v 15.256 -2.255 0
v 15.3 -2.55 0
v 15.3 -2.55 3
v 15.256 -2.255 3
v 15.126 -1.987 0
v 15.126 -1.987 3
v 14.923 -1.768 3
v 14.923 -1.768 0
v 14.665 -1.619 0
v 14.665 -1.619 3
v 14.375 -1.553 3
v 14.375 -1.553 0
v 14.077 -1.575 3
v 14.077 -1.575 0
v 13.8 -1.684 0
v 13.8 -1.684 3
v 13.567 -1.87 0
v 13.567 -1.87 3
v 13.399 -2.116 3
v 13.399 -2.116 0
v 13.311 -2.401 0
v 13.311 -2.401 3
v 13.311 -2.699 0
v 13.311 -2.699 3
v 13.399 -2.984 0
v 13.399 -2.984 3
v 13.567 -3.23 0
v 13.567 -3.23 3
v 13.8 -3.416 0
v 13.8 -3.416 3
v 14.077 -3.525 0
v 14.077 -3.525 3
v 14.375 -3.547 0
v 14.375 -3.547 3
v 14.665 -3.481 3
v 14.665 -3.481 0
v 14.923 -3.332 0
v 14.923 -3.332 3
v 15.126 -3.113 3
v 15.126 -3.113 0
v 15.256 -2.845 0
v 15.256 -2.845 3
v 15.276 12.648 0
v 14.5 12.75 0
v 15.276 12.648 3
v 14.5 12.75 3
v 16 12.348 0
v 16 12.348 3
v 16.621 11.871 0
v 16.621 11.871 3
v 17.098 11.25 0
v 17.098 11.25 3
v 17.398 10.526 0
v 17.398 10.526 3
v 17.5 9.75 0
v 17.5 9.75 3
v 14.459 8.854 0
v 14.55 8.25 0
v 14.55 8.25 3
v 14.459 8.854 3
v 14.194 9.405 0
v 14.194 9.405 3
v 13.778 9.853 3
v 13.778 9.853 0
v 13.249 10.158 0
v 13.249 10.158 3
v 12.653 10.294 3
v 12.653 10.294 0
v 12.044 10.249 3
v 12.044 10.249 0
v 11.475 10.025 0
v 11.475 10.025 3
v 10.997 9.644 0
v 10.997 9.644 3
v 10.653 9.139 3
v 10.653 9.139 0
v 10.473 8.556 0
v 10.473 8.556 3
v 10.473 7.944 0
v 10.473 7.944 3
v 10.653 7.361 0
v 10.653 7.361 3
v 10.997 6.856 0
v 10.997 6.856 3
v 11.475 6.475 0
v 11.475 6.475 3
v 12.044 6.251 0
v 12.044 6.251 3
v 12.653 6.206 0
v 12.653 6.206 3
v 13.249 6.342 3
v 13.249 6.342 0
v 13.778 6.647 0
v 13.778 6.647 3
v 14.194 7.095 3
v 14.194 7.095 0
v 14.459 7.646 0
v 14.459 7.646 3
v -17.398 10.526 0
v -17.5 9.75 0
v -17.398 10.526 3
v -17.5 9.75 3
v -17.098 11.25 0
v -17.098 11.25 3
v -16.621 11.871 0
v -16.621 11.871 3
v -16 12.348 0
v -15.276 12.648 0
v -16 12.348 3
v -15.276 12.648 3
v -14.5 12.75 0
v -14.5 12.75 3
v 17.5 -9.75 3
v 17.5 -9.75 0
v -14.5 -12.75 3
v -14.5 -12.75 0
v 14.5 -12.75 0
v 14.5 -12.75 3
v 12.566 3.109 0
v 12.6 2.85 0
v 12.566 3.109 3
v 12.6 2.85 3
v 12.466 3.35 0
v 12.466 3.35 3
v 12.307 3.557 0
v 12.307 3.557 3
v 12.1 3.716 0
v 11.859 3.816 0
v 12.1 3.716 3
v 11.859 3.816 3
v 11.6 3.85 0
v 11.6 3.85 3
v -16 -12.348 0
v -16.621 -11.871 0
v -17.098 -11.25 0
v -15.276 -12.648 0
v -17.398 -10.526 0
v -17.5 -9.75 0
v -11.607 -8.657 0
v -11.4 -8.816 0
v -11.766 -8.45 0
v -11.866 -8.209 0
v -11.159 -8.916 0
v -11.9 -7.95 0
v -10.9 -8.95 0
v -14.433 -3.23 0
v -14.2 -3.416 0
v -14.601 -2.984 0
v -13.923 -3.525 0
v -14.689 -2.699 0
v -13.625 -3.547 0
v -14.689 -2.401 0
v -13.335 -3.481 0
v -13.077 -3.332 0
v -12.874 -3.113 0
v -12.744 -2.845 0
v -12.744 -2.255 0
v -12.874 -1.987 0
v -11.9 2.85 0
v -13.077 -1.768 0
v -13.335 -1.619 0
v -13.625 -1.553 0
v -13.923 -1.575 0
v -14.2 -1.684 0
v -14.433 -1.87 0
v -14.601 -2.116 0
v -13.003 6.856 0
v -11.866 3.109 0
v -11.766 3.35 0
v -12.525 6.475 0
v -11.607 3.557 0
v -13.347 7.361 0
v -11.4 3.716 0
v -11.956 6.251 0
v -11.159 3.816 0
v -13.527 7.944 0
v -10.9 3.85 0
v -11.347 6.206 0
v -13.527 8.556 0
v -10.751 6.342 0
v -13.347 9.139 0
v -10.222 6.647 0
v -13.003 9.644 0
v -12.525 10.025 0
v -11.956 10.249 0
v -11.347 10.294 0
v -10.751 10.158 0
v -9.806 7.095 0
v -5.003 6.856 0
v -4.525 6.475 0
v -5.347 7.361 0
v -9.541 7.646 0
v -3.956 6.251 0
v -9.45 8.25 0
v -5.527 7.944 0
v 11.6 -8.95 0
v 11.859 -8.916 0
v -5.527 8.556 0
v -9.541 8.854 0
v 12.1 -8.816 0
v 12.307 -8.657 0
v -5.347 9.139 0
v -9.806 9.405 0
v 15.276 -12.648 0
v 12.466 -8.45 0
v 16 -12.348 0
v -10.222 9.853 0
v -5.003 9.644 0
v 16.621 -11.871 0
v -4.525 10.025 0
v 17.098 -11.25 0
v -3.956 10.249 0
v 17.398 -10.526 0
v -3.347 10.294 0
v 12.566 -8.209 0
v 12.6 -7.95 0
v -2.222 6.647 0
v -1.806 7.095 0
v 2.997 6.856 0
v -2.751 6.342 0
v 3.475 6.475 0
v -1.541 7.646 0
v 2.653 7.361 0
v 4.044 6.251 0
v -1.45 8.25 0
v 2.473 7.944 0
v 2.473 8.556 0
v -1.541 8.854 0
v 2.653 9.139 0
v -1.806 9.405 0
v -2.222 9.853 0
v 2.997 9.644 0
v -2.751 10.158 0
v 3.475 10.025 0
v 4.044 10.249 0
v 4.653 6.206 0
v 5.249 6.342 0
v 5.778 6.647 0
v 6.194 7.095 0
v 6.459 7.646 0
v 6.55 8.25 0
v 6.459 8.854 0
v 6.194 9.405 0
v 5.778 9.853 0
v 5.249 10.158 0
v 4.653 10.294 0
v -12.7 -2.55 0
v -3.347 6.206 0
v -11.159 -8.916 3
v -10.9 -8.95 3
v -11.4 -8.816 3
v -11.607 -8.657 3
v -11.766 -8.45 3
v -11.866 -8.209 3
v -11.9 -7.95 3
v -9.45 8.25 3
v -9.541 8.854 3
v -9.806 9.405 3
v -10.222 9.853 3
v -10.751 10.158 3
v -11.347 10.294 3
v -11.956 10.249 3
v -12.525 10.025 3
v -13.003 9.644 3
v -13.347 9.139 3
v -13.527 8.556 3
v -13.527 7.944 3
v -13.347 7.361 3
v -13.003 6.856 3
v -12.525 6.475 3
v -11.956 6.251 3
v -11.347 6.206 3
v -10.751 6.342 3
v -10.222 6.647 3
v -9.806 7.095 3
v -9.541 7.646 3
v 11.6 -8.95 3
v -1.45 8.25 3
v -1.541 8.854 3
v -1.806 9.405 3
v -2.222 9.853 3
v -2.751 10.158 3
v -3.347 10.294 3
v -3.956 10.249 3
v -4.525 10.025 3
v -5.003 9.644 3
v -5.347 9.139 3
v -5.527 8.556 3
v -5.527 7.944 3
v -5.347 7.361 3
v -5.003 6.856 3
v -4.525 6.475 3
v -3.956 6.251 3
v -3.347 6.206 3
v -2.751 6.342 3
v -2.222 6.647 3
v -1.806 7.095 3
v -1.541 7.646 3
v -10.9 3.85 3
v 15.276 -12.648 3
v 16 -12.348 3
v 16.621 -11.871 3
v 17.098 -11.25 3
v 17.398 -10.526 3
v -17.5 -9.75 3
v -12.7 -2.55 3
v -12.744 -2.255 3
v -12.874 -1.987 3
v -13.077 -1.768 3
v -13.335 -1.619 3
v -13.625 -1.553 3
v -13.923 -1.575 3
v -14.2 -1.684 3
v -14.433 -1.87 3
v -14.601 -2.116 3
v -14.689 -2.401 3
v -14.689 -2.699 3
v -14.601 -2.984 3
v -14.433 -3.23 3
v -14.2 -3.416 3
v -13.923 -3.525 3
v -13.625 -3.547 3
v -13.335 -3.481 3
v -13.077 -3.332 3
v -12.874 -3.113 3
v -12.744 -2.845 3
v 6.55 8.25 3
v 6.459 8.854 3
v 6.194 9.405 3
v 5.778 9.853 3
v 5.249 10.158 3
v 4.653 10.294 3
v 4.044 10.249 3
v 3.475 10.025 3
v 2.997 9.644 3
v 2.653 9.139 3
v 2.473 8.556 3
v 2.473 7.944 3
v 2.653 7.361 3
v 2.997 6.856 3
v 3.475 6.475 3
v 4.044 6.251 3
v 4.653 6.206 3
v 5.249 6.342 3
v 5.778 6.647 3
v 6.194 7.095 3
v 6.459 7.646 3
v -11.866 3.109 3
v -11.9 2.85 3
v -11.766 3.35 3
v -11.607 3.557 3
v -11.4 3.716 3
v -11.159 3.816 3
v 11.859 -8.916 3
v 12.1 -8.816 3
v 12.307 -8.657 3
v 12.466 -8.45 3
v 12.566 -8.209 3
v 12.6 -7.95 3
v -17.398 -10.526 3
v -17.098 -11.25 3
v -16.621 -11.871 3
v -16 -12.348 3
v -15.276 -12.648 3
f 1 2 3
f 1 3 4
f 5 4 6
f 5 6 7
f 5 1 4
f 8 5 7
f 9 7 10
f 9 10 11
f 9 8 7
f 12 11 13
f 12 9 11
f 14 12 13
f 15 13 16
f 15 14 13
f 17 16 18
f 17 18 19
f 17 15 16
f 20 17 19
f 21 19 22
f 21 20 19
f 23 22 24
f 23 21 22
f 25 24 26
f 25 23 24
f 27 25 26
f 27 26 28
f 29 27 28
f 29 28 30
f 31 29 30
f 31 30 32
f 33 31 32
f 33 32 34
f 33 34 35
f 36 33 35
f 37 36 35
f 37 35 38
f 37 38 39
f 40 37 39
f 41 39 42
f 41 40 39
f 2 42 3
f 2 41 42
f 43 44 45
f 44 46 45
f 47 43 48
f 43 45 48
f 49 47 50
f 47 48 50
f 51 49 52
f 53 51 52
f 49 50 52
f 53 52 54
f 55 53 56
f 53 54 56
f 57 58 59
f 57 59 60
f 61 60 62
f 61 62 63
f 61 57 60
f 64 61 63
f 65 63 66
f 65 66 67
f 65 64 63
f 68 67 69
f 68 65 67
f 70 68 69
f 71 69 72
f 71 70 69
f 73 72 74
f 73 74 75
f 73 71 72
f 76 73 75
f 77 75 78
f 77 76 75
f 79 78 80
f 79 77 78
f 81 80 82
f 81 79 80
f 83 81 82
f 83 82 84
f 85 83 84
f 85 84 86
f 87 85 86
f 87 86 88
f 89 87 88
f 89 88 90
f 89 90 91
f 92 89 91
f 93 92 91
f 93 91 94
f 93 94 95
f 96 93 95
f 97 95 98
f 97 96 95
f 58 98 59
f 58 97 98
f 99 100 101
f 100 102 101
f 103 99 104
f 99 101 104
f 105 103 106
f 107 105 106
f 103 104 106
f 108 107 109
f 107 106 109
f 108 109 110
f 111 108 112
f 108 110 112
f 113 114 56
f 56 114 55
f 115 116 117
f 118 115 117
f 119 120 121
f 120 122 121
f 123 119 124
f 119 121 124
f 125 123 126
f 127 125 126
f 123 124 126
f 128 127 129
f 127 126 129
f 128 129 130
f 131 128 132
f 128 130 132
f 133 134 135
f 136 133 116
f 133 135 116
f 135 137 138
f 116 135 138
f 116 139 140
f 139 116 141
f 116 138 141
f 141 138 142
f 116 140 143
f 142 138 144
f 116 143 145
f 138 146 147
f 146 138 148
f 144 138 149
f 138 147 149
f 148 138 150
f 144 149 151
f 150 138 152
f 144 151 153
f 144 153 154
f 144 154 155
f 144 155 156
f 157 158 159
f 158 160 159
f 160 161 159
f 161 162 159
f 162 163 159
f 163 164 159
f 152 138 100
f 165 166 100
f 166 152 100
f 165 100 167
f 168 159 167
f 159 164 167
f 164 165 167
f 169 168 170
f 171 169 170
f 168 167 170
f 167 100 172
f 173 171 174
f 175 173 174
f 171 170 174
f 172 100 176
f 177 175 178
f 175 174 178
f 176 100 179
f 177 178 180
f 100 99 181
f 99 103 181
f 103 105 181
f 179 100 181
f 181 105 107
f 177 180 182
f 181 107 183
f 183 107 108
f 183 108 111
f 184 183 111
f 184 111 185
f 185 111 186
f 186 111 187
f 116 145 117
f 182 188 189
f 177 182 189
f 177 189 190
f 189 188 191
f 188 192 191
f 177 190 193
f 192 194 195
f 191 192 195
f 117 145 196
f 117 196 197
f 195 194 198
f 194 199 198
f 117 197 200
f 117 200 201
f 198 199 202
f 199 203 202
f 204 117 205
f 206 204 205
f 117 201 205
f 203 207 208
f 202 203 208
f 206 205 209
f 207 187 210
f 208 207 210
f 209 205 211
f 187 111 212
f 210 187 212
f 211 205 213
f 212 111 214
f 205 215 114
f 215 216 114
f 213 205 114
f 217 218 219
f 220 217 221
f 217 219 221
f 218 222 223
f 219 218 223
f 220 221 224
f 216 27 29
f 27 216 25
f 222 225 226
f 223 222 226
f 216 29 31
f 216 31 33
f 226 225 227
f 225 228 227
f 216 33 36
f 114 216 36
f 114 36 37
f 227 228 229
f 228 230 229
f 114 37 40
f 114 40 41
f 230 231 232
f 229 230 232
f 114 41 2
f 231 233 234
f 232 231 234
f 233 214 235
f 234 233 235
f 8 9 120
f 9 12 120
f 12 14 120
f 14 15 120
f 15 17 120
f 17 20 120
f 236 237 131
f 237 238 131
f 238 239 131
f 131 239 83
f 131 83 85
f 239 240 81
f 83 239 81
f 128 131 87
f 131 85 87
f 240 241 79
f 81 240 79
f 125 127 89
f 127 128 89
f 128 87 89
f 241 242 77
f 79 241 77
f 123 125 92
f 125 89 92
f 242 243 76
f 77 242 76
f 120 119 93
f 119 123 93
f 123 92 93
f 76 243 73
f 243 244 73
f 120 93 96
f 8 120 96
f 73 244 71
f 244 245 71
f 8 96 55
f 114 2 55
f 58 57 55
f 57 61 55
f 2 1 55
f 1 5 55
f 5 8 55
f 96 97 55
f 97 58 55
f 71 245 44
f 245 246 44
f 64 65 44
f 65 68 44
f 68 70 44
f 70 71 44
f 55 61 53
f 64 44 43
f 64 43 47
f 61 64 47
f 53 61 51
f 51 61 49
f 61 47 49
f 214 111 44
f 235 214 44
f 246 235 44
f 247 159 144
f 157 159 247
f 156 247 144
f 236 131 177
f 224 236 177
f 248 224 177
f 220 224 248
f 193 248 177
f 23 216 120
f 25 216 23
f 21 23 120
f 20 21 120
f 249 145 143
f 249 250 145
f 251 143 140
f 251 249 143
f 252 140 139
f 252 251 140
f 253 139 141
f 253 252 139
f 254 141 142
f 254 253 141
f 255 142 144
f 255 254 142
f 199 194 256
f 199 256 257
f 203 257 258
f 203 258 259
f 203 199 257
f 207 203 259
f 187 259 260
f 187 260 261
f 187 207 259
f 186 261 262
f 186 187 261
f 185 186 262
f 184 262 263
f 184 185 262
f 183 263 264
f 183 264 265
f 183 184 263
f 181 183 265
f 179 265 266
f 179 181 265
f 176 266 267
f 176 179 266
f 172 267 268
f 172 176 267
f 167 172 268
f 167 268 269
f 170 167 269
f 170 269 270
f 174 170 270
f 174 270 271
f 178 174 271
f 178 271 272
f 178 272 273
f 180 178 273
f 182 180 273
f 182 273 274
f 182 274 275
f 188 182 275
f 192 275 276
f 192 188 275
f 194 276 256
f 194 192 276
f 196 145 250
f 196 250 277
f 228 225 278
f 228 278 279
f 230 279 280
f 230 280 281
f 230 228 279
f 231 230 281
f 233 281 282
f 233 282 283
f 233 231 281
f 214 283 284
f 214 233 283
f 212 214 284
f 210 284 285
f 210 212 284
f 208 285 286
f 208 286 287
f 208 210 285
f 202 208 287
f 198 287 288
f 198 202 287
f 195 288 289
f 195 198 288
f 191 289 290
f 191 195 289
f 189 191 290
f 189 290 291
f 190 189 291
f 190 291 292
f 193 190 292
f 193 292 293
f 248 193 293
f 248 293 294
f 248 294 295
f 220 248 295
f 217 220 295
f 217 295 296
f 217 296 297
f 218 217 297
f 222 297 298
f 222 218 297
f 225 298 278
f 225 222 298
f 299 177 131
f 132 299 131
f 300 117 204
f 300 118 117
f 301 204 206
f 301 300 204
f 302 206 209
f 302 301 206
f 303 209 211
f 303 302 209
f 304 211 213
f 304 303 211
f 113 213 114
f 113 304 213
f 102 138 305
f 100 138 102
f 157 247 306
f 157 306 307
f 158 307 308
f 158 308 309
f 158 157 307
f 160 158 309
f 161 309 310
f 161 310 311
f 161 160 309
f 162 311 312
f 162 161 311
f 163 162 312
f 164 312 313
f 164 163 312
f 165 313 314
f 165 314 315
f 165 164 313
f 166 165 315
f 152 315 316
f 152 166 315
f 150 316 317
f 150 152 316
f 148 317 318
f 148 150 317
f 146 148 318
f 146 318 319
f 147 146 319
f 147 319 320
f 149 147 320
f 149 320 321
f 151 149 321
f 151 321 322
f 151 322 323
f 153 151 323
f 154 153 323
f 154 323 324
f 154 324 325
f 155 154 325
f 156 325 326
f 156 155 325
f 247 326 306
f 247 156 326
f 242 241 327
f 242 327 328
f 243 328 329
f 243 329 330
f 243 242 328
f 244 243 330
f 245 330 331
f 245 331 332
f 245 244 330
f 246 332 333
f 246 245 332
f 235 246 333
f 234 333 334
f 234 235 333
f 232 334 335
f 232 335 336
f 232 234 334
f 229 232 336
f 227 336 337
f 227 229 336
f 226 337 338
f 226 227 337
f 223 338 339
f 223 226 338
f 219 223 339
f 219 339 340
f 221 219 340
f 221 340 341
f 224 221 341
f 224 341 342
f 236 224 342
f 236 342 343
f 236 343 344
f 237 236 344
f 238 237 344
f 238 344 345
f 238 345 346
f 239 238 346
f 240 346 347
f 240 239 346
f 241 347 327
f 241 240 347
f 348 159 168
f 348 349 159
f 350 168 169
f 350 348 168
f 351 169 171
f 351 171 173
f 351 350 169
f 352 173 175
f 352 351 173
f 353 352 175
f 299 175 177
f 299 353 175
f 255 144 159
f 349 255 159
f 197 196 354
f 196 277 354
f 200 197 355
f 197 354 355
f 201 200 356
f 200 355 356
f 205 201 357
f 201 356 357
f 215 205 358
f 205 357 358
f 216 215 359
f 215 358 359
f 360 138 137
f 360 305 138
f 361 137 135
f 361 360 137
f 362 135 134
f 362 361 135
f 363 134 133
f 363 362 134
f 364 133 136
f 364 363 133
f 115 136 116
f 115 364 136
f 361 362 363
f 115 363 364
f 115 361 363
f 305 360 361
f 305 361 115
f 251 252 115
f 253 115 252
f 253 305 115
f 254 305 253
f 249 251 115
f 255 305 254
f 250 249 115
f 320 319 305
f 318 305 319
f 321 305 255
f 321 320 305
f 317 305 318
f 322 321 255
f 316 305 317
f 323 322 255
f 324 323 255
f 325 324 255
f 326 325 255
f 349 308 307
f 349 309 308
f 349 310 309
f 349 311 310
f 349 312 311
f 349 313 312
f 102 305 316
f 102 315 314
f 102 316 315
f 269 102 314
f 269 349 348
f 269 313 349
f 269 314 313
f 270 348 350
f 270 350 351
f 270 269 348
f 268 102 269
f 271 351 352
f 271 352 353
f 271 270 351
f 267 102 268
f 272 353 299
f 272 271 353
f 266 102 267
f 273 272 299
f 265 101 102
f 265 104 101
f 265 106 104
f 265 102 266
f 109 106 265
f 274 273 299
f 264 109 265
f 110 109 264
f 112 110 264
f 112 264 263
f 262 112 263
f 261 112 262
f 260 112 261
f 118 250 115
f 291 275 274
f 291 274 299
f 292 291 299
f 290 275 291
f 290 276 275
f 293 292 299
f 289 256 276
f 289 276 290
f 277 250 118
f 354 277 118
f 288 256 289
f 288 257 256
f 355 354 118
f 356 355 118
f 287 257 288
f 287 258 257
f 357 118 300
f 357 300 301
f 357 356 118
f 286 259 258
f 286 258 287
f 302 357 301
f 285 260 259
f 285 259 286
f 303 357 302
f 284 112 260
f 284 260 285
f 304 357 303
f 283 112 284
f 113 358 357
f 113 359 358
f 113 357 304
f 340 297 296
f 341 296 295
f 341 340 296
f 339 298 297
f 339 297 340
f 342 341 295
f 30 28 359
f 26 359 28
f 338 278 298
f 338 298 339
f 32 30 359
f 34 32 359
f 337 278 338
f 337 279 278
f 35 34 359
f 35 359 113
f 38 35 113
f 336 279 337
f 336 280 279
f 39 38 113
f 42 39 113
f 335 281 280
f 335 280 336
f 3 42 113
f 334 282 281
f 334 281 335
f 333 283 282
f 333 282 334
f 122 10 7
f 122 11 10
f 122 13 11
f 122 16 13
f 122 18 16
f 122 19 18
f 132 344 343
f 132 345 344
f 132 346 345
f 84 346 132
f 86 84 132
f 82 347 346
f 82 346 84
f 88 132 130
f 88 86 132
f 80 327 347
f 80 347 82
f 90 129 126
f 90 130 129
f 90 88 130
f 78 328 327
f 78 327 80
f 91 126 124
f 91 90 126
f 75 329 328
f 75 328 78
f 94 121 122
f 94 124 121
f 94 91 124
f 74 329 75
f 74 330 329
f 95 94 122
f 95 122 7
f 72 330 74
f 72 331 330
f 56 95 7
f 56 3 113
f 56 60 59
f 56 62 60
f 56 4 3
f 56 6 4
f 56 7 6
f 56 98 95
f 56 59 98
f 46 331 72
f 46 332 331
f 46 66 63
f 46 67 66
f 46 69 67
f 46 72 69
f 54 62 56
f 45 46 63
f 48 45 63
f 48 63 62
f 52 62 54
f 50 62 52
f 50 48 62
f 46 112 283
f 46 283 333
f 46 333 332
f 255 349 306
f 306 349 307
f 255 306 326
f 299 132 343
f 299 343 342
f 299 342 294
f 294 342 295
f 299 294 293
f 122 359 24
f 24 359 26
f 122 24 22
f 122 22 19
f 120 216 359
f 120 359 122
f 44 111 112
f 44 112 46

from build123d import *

# Parameters (mm, degrees)
F1_W     = 35
F1_H     = 25.5
F1_R     = 1
F1_W_2   = 24.5
F1_H_2   = 12.8
F1_R_2   = 2.05
F2_DEPTH = 3
F3_R     = 3
F4_R     = 1


with BuildPart() as f2:
    # F1 (on Top) → F2 (new body)
    with BuildSketch(Plane.XY):
        Rectangle(F1_W, F1_H)
        with Locations((-13.7, -2.55)):
            Circle(F1_R, mode=Mode.SUBTRACT)
        with Locations((0.35, -2.55)):
            Rectangle(F1_W_2, F1_H_2, mode=Mode.SUBTRACT)
        with Locations((14.3, -2.55)):
            Circle(F1_R, mode=Mode.SUBTRACT)
        with Locations((-11.5, 8.25)):
            Circle(F1_R_2, mode=Mode.SUBTRACT)
        with Locations((-3.5, 8.25)):
            Circle(F1_R_2, mode=Mode.SUBTRACT)
        with Locations((4.5, 8.25)):
            Circle(F1_R_2, mode=Mode.SUBTRACT)
        with Locations((12.5, 8.25)):
            Circle(F1_R_2, mode=Mode.SUBTRACT)
    extrude(amount=F2_DEPTH)

    # F3
    f3_edges = [f2.edges().sort_by_distance(p)[0] for p in [
        (-17.5, 12.75, 1.5),
        (17.5, 12.75, 1.5),
        (17.5, -12.75, 1.5),
        (-17.5, -12.75, 1.5),
    ]]
    fillet(f3_edges, radius=F3_R)

    # F4
    f4_edges = [f2.edges().sort_by_distance(p)[0] for p in [
        (-11.9, 3.85, 1.5),
        (12.6, 3.85, 1.5),
        (12.6, -8.95, 1.5),
        (-11.9, -8.95, 1.5),
    ]]
    fillet(f4_edges, radius=F4_R)


solid = f2.part
